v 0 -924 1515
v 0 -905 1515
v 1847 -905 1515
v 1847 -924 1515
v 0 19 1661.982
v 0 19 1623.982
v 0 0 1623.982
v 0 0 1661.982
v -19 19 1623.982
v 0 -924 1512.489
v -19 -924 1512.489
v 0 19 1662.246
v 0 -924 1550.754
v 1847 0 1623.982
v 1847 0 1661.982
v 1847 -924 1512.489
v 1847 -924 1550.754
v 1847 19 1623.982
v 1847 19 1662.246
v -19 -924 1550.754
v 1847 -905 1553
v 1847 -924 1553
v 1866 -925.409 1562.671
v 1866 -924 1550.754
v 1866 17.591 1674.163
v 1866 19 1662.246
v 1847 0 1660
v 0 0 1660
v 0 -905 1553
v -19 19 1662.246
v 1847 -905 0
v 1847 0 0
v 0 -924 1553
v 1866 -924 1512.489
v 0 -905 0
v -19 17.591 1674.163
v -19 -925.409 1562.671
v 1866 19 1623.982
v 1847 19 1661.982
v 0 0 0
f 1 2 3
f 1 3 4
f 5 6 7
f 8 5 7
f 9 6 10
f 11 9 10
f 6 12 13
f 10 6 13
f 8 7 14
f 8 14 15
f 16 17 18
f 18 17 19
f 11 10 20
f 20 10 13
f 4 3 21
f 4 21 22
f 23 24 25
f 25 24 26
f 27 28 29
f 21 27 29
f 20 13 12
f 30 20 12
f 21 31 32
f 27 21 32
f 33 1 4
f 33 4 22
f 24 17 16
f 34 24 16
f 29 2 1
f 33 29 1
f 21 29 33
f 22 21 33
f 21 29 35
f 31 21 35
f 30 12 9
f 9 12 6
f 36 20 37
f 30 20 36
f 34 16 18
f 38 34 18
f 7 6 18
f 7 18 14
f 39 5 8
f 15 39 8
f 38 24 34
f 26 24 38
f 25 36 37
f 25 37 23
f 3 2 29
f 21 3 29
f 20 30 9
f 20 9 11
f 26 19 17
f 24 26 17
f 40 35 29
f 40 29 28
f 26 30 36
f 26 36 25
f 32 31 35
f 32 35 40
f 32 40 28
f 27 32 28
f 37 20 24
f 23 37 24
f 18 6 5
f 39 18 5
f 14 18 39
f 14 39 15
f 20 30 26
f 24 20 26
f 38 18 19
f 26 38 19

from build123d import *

# Parameters (mm, degrees)
F1_DEPTH = 1847
F2_W     = 19
F2_H     = 38
F3_DEPTH = 1847
F5_DEPTH = 19
F7_DEPTH = 19
F8_W     = 1885
F8_H     = 949.568138
F9_DEPTH = 12


with BuildPart() as f1:
    # F0 (on Right) → F1 (new body)
    with BuildSketch(Plane.YZ):
        Polygon((-905, 0), (0, 0), (0, 1660), (-905, 1553), align=None)
    extrude(amount=F1_DEPTH)


with BuildPart() as f3:
    # F2 (on face) → F3 (new body, through all)
    with BuildSketch(Plane(origin=(0, 0, 0), x_dir=(0, -1, 0), z_dir=(-1, 0, 0))):
        with Locations((914.5, 1534)):
            Rectangle(F2_W, F2_H)
        with Locations((-9.5, 1642.981733)):
            Rectangle(F2_W, F2_H)
    extrude(amount=-F3_DEPTH)


with BuildPart() as f5:
    # F4 (on face) → F5 (new body)
    with BuildSketch(Plane(origin=(0, 0, 0), x_dir=(0, -1, 0), z_dir=(-1, 0, 0))):
        Polygon((924, 1550.753591), (-19, 1662.246409), (-19, 1623.981733), (924, 1512.488915), align=None)
    extrude(amount=F5_DEPTH)


with BuildPart() as f7:
    # F6 (on face) → F7 (new body)
    with BuildSketch(Plane.YZ.offset(1847)):
        Polygon((-924, 1512.488915), (19, 1623.981733), (19, 1662.246409), (-924, 1550.753591), align=None)
    extrude(amount=F7_DEPTH)


with BuildPart() as f9:
    # F8 (on face) → F9 (new body)
    with BuildSketch(Plane(origin=(0, -193.559461, 1637.115069), x_dir=(1, 0, 0), z_dir=(0, -0.117414, 0.993083))):
        with Locations((923.5, -260.744099)):
            Rectangle(F8_W, F8_H)
    extrude(amount=F9_DEPTH)


solid = Compound([f1.part, f3.part, f5.part, f7.part, f9.part])
